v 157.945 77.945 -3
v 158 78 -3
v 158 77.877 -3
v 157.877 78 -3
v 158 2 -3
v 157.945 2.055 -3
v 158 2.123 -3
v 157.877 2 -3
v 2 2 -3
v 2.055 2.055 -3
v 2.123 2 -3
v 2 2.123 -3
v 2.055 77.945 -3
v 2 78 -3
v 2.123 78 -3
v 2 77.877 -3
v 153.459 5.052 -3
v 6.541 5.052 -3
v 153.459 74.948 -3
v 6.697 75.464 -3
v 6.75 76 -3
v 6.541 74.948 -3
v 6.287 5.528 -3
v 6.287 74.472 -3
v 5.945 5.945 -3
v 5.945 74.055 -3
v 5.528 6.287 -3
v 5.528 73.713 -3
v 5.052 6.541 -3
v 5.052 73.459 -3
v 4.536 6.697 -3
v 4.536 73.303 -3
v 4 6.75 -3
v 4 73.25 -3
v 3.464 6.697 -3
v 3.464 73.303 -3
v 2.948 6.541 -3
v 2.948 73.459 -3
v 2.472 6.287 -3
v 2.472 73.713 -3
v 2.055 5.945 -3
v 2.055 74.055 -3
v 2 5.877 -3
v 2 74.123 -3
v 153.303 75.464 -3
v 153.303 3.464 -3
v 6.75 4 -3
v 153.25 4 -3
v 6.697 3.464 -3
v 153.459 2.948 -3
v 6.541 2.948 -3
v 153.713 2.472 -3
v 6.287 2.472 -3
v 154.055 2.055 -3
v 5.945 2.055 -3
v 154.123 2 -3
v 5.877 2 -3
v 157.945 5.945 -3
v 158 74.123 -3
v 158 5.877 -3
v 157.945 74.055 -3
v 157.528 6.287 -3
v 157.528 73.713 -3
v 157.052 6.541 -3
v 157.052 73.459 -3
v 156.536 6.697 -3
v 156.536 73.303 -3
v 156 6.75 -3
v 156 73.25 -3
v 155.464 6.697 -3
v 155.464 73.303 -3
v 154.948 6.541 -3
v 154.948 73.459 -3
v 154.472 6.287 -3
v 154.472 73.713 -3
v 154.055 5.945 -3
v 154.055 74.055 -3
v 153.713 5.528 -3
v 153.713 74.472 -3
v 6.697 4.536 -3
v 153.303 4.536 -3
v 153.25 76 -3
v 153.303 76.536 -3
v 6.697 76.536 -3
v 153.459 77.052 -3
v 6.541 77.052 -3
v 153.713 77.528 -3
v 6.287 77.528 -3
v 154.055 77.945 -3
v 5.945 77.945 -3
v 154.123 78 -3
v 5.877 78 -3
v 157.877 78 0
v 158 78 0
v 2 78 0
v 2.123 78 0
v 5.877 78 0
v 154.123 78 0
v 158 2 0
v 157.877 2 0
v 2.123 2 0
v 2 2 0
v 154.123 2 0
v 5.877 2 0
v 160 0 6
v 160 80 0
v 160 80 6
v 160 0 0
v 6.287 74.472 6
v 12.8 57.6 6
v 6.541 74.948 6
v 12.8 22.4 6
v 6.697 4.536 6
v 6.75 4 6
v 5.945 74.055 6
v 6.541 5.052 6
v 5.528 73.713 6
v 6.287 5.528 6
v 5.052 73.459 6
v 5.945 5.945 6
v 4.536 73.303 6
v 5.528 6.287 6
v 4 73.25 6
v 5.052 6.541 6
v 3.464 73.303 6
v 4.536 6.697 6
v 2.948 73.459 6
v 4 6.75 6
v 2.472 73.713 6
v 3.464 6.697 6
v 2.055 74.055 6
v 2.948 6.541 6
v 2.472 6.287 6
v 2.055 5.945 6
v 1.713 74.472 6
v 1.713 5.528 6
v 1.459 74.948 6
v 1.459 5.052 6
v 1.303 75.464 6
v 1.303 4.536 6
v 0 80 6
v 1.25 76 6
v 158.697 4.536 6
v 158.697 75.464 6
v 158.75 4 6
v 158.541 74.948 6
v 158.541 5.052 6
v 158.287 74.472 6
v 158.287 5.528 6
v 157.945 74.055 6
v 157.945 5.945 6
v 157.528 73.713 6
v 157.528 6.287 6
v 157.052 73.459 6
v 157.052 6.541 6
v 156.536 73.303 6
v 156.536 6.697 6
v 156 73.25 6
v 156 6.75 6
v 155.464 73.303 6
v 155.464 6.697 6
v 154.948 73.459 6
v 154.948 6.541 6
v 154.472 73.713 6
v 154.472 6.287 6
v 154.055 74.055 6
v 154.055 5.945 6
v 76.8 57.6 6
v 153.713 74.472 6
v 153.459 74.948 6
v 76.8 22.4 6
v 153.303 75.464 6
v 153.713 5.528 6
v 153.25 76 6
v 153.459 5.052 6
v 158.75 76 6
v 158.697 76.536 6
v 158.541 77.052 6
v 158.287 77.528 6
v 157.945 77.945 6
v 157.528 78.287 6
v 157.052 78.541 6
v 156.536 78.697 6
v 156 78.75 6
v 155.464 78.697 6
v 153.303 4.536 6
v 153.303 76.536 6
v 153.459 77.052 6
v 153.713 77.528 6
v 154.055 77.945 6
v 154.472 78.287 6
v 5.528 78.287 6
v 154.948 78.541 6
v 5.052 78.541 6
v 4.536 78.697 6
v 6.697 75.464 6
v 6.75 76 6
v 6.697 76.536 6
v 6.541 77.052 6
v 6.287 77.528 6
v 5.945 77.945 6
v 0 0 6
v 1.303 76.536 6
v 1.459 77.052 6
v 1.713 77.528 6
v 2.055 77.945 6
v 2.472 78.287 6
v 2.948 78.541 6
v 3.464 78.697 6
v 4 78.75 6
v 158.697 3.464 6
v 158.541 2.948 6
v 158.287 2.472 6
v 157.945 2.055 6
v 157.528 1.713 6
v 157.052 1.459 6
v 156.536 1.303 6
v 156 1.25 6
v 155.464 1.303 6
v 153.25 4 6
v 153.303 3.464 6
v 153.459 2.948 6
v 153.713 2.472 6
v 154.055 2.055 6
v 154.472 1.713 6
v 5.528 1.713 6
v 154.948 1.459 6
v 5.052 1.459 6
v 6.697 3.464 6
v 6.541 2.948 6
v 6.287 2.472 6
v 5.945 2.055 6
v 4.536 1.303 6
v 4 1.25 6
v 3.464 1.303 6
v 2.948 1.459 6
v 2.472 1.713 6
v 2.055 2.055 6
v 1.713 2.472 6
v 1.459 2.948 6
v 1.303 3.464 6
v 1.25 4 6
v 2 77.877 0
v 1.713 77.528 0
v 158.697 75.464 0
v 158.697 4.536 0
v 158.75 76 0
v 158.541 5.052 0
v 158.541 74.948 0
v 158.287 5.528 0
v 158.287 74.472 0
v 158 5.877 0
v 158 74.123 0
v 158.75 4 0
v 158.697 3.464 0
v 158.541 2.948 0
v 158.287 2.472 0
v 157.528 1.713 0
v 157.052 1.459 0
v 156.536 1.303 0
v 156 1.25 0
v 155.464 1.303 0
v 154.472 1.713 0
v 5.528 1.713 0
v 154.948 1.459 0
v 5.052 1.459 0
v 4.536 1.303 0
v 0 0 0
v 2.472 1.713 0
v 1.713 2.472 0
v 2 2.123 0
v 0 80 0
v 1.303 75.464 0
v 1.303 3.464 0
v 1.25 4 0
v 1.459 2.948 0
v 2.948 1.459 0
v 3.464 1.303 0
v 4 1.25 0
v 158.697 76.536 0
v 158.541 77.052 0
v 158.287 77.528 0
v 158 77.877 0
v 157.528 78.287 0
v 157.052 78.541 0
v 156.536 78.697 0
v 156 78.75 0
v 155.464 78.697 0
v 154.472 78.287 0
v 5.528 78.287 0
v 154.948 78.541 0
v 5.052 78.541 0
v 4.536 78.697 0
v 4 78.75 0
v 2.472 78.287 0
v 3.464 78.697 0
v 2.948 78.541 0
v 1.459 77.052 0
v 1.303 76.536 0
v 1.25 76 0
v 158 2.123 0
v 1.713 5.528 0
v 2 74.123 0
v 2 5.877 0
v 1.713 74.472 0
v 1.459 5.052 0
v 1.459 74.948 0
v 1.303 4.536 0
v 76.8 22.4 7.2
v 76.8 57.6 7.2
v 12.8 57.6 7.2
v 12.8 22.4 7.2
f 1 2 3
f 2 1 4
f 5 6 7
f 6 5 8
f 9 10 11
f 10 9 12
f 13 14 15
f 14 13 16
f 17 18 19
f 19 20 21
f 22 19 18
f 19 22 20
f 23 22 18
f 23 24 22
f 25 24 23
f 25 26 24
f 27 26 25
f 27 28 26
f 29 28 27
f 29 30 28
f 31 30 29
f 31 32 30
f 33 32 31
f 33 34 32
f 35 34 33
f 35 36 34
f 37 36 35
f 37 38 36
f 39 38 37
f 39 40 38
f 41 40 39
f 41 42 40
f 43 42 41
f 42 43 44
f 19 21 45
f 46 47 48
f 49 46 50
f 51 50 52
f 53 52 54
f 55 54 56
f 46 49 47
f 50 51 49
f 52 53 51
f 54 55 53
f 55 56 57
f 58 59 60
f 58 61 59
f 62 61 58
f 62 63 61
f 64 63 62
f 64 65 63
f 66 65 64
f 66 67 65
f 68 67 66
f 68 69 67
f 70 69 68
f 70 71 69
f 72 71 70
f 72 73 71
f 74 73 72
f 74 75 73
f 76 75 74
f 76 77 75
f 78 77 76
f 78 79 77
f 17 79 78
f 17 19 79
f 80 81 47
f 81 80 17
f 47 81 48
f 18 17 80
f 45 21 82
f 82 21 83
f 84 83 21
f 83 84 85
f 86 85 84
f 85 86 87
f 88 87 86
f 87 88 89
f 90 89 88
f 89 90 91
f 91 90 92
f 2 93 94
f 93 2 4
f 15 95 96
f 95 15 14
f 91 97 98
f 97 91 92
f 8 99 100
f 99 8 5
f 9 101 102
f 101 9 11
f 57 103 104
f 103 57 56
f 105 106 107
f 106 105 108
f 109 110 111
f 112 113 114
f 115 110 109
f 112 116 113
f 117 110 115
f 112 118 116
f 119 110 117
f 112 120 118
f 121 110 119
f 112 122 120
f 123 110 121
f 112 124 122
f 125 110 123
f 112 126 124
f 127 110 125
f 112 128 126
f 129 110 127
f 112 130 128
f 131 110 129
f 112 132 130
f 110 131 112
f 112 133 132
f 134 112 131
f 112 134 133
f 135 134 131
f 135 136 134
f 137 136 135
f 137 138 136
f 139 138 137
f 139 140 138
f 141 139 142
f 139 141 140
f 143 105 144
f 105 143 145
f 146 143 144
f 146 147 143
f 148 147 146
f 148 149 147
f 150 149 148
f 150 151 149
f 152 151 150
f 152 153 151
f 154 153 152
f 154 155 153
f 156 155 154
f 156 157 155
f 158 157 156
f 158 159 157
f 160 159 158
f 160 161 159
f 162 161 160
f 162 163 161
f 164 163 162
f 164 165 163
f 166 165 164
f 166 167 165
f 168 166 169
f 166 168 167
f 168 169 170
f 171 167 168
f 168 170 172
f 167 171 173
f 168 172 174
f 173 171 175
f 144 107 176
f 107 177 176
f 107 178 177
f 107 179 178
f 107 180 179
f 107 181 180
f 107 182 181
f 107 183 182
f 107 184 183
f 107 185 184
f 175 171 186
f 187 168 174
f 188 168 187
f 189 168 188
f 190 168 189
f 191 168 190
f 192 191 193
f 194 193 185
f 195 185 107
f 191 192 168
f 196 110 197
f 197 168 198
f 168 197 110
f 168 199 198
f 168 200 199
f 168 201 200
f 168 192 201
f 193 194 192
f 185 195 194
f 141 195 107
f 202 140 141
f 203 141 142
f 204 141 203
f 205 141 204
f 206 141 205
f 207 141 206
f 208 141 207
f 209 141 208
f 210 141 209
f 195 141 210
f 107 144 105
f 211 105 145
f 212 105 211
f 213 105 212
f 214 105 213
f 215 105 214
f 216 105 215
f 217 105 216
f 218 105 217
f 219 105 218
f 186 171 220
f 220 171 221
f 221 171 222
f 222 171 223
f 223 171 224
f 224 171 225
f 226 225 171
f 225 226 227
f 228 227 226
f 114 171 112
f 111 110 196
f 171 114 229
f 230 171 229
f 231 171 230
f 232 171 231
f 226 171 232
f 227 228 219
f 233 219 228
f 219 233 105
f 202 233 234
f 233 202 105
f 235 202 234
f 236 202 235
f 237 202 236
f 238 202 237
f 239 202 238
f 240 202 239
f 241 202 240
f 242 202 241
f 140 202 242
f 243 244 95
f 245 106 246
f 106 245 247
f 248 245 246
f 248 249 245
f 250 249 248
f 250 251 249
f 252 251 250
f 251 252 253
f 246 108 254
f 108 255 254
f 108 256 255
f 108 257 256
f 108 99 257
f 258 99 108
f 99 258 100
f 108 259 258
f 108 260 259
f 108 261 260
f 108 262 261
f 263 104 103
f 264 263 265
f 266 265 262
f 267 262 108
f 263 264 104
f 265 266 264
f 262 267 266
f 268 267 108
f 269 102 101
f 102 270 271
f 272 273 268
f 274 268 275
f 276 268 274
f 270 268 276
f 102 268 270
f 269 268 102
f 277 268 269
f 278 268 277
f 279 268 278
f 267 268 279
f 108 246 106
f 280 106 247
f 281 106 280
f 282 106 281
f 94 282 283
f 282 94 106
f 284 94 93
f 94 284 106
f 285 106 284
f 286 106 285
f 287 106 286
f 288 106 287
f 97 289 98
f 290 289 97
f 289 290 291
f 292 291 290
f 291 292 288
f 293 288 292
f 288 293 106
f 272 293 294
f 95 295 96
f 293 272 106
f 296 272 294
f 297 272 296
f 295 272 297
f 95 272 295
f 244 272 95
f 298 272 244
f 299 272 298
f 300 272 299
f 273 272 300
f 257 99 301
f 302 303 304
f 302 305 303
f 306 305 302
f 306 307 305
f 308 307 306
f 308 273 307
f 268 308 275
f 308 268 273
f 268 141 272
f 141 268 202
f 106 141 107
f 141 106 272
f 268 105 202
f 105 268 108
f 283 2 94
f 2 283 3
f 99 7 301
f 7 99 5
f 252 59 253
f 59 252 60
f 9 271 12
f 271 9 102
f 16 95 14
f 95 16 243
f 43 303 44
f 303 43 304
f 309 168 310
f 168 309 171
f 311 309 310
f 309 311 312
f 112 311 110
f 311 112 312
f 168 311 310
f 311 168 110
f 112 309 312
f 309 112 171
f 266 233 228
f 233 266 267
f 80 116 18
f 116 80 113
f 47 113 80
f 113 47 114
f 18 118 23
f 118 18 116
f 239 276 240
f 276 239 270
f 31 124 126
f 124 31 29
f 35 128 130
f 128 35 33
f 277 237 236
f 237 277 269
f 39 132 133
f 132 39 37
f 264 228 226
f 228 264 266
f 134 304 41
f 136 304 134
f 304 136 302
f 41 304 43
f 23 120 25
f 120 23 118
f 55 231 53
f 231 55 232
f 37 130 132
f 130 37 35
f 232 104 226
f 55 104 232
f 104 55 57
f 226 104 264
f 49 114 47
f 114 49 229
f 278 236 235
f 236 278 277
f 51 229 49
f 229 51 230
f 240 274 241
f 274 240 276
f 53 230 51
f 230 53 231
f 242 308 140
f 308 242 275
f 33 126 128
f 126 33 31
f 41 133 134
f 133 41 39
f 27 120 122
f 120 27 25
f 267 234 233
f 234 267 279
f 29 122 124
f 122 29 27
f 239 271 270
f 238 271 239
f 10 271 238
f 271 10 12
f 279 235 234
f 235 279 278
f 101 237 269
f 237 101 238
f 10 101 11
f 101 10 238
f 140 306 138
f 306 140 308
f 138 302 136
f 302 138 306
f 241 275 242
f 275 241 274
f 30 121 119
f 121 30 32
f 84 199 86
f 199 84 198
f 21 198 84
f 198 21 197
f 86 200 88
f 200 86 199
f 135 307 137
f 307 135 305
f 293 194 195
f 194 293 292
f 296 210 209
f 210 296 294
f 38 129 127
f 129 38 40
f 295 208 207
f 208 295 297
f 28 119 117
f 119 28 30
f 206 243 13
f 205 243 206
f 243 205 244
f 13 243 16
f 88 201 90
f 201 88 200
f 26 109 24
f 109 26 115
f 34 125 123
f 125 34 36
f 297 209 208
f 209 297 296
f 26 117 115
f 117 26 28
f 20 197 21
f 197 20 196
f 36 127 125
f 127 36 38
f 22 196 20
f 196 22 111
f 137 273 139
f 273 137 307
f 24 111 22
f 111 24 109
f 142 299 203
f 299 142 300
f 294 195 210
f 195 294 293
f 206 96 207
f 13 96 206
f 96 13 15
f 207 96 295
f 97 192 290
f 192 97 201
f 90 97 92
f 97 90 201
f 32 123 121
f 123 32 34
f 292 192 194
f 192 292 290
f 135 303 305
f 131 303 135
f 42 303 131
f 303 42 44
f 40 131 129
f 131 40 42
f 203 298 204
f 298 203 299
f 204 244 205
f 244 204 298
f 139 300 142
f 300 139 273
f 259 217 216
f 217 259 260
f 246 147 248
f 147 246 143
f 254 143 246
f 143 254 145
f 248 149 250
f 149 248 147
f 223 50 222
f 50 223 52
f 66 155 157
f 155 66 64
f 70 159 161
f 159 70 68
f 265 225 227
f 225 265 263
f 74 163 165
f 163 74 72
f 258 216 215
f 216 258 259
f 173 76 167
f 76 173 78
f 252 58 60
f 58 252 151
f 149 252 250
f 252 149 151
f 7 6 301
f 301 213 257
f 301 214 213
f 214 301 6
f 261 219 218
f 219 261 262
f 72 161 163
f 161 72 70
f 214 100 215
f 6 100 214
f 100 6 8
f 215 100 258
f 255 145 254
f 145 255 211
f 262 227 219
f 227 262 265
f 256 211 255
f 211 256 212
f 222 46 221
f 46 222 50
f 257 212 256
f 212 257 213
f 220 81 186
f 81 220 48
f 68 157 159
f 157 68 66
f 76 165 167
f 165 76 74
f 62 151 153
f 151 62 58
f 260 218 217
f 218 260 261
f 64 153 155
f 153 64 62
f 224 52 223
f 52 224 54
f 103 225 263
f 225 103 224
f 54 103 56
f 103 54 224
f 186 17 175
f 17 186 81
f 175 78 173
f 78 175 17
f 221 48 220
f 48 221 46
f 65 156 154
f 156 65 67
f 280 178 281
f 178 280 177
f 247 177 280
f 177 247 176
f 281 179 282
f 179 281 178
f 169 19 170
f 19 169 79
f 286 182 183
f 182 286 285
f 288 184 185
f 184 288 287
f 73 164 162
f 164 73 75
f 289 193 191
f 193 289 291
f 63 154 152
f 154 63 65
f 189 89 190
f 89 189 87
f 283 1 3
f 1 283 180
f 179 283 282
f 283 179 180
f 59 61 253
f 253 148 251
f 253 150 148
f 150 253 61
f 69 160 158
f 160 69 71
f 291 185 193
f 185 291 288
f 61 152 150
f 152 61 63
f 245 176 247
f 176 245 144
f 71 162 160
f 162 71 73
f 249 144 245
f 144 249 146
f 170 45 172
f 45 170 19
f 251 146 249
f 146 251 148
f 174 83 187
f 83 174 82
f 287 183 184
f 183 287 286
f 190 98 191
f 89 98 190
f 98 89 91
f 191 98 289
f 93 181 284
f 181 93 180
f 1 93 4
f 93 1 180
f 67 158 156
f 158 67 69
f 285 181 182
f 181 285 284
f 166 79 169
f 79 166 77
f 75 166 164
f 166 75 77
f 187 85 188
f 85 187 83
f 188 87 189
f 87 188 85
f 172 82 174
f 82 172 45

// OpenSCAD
$fn = 32;

// ----------------------------------------------------------------------
// Enclosure lid: 160 x 80 x 6 mm, 4 bolt holes
// ----------------------------------------------------------------------

// --- parameters (mm) ---
length = 160;             // lid length, X
width = 80;               // lid width, Y
plate_t = 6;              // lid plate thickness
bolt_d = 5.5;             // bolt clearance
boss_lip = 4;             // bolt hole inset from the corner
sink = 1;                 // overlap of the lip and ribs into the plate
lip_h = 4;                // lip height below the plate
lip_wall = 2;             // lip wall thickness
rib_n = 2;                // stiffening ribs
rib_t = 3;                // rib thickness
rib_h = 4;                // rib height below the plate
label_h = 1.2;            // raised marking pad

module plate() {
  cube([length, width, plate_t]);
  /* lip that drops into the housing opening, sunk into the plate */
  translate([lip_wall, lip_wall, -lip_h + sink]) cube([length - 2 * lip_wall, width - 2 * lip_wall, lip_h]);
  /* stiffening ribs under the plate */
  for (i = [1 : rib_n]) translate([length * i / (rib_n + 1) - rib_t / 2, lip_wall, -rib_h + sink]) cube([rib_t, width - 2 * lip_wall, rib_h]);
  /* raised marking pad on top, sunk 1 mm into the plate */
  translate([length * 0.08, width * 0.28, plate_t - 1]) cube([length * 0.4, width * 0.44, label_h + 1]);
}

difference() {
  plate();
  /* bolt pattern matching the corner bosses */
  for (sx = [0, 1]) for (sy = [0, 1])
    translate([sx * (length - 2 * boss_lip) + boss_lip, sy * (width - 2 * boss_lip) + boss_lip, -lip_h - 1])
      cylinder(h = plate_t + lip_h + 2, d = bolt_d);
}
